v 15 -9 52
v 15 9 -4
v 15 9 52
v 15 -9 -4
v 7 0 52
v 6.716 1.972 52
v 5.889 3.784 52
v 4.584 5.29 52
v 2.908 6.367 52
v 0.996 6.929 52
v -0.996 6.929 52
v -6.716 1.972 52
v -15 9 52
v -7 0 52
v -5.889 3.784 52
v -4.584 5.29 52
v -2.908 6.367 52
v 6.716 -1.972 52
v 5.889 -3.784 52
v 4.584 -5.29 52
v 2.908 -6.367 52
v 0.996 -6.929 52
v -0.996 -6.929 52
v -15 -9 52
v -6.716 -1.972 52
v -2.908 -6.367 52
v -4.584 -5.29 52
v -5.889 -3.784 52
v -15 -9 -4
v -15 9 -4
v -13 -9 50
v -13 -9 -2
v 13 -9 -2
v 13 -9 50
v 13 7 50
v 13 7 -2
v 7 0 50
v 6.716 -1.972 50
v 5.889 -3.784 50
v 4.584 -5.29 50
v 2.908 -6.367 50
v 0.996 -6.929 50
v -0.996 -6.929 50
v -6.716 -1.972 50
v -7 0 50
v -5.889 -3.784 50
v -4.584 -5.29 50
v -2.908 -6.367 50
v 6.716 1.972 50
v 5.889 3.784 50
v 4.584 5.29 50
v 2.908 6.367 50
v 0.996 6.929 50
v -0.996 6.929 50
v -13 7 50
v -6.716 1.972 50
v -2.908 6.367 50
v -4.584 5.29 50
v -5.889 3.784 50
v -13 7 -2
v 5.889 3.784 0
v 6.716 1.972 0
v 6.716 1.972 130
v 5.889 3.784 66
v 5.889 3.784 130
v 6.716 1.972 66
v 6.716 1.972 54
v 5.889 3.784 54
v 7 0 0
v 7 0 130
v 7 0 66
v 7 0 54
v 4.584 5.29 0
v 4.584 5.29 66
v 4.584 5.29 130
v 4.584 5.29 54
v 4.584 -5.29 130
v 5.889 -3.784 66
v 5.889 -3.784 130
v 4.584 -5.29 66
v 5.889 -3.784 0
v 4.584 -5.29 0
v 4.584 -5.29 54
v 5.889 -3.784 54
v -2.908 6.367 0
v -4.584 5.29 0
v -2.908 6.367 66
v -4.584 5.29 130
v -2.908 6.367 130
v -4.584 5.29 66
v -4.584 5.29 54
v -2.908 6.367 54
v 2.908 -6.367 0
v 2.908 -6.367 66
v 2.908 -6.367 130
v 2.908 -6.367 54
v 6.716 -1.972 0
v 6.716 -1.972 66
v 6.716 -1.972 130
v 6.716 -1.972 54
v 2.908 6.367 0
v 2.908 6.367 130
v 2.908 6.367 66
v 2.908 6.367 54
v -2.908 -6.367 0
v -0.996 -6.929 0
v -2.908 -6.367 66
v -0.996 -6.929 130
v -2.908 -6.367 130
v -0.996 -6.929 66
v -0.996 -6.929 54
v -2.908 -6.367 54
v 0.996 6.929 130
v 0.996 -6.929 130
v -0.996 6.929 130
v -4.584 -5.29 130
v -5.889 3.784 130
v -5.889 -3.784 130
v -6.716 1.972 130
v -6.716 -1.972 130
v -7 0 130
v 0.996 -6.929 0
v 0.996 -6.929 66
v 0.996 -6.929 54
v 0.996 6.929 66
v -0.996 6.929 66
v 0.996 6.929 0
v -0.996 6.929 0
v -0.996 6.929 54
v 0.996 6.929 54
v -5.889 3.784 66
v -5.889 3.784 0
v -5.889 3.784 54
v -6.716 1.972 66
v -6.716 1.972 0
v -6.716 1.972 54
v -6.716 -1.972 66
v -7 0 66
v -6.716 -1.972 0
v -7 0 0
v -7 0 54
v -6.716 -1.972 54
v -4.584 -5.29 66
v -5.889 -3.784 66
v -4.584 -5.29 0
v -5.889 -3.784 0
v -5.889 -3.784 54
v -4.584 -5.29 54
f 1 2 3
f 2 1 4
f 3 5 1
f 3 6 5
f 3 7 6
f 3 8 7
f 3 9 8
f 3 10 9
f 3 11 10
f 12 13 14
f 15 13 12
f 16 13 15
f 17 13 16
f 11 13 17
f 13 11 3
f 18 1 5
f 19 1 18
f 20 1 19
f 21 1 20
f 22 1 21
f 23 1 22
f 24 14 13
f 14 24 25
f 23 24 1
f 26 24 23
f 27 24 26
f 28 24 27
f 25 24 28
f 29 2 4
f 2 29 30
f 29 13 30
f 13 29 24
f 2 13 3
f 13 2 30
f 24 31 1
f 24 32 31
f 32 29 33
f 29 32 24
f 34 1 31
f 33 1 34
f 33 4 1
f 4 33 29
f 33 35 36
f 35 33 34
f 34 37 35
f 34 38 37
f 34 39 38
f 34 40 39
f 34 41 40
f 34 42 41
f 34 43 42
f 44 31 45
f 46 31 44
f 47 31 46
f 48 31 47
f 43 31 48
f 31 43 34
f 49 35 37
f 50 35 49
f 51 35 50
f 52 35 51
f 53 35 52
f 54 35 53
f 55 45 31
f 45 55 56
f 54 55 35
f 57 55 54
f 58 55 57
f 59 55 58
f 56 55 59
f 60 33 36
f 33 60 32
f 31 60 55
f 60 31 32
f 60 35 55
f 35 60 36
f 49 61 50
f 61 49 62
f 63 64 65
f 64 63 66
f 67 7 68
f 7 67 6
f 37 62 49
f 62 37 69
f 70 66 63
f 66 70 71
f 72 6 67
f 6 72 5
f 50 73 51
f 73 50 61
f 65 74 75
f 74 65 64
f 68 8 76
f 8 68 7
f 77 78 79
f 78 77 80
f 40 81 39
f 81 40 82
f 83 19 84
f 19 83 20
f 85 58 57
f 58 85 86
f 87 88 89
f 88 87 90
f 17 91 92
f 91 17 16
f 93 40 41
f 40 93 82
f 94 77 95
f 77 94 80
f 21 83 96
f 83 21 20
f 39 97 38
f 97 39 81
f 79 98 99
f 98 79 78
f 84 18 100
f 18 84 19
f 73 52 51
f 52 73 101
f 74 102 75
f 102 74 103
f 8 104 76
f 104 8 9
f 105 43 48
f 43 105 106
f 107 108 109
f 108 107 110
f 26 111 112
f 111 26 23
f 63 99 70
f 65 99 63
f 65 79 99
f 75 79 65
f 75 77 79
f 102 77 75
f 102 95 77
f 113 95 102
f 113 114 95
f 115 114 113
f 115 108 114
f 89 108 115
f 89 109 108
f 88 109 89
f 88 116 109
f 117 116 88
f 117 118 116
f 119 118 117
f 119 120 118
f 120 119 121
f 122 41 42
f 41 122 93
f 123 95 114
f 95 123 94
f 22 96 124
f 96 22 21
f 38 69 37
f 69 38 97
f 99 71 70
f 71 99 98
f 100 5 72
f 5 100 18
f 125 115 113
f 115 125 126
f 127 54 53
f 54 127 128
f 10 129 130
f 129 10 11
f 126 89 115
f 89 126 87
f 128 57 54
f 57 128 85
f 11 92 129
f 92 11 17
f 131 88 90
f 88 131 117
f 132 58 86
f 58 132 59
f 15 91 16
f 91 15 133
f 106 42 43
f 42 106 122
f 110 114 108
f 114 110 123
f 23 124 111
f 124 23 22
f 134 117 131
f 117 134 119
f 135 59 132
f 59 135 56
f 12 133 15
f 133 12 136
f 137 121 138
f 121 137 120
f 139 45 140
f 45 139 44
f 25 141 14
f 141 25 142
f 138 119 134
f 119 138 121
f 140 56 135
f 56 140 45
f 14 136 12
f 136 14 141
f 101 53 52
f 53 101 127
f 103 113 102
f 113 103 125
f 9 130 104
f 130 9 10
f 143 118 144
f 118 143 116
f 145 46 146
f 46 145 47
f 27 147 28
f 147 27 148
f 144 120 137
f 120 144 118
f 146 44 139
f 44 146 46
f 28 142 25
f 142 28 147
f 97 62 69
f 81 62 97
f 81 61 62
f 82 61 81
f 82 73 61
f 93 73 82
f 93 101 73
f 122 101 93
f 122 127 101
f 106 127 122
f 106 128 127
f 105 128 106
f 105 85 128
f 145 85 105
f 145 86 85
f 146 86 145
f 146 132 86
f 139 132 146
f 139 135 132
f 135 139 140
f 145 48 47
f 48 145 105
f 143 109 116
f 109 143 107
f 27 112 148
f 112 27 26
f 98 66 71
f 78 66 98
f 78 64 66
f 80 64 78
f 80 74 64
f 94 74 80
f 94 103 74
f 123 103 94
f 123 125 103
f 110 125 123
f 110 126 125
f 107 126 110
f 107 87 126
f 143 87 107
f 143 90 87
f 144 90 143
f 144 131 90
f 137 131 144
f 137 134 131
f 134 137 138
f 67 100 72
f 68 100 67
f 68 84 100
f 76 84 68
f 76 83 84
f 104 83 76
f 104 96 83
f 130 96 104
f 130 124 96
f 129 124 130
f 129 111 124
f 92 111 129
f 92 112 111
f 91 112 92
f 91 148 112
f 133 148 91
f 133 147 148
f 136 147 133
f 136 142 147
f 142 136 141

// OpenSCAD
module core(deg){
color("red")
rotate([0,0,deg])
translate([0,0,160/2+2]) 
cube(size = [11,1.8,160], center = true);
}

module porta9V(){
	translate([0,0,48/2])
	difference(){
		cube(size = [30,18,56], center = true);
		translate([0,-2,0])cube(size = [26,18,52], center = true);
	}
}




module cil_vairlla(){
difference(){
 	union(){
		translate([0,0,47.8])cylinder(h = 150-48, r=7);
		porta9V();
	}
	for ( dg = [0 : 360/8 : 360] )
	{
 		core(dg);
	}
	color("green")translate([0,0,3])cylinder(h = 150, r=3);

}
}


module varilla(){
difference(){
 	union(){
		cylinder(h = 130, r=7);

	}
	translate([0,0,-3])for ( dg = [0 : 360/8 : 360] )
	{
 		core(dg);
	}
	color("green")translate([0,0,-3])cylinder(h = 150, r=3);

}
}

//cil_vairlla();
//varilla();
porta9V();
difference(){
cylinder(h = 130, r=7);
translate([0,0,60])cube(size = [18,18,12], center = true);
}
